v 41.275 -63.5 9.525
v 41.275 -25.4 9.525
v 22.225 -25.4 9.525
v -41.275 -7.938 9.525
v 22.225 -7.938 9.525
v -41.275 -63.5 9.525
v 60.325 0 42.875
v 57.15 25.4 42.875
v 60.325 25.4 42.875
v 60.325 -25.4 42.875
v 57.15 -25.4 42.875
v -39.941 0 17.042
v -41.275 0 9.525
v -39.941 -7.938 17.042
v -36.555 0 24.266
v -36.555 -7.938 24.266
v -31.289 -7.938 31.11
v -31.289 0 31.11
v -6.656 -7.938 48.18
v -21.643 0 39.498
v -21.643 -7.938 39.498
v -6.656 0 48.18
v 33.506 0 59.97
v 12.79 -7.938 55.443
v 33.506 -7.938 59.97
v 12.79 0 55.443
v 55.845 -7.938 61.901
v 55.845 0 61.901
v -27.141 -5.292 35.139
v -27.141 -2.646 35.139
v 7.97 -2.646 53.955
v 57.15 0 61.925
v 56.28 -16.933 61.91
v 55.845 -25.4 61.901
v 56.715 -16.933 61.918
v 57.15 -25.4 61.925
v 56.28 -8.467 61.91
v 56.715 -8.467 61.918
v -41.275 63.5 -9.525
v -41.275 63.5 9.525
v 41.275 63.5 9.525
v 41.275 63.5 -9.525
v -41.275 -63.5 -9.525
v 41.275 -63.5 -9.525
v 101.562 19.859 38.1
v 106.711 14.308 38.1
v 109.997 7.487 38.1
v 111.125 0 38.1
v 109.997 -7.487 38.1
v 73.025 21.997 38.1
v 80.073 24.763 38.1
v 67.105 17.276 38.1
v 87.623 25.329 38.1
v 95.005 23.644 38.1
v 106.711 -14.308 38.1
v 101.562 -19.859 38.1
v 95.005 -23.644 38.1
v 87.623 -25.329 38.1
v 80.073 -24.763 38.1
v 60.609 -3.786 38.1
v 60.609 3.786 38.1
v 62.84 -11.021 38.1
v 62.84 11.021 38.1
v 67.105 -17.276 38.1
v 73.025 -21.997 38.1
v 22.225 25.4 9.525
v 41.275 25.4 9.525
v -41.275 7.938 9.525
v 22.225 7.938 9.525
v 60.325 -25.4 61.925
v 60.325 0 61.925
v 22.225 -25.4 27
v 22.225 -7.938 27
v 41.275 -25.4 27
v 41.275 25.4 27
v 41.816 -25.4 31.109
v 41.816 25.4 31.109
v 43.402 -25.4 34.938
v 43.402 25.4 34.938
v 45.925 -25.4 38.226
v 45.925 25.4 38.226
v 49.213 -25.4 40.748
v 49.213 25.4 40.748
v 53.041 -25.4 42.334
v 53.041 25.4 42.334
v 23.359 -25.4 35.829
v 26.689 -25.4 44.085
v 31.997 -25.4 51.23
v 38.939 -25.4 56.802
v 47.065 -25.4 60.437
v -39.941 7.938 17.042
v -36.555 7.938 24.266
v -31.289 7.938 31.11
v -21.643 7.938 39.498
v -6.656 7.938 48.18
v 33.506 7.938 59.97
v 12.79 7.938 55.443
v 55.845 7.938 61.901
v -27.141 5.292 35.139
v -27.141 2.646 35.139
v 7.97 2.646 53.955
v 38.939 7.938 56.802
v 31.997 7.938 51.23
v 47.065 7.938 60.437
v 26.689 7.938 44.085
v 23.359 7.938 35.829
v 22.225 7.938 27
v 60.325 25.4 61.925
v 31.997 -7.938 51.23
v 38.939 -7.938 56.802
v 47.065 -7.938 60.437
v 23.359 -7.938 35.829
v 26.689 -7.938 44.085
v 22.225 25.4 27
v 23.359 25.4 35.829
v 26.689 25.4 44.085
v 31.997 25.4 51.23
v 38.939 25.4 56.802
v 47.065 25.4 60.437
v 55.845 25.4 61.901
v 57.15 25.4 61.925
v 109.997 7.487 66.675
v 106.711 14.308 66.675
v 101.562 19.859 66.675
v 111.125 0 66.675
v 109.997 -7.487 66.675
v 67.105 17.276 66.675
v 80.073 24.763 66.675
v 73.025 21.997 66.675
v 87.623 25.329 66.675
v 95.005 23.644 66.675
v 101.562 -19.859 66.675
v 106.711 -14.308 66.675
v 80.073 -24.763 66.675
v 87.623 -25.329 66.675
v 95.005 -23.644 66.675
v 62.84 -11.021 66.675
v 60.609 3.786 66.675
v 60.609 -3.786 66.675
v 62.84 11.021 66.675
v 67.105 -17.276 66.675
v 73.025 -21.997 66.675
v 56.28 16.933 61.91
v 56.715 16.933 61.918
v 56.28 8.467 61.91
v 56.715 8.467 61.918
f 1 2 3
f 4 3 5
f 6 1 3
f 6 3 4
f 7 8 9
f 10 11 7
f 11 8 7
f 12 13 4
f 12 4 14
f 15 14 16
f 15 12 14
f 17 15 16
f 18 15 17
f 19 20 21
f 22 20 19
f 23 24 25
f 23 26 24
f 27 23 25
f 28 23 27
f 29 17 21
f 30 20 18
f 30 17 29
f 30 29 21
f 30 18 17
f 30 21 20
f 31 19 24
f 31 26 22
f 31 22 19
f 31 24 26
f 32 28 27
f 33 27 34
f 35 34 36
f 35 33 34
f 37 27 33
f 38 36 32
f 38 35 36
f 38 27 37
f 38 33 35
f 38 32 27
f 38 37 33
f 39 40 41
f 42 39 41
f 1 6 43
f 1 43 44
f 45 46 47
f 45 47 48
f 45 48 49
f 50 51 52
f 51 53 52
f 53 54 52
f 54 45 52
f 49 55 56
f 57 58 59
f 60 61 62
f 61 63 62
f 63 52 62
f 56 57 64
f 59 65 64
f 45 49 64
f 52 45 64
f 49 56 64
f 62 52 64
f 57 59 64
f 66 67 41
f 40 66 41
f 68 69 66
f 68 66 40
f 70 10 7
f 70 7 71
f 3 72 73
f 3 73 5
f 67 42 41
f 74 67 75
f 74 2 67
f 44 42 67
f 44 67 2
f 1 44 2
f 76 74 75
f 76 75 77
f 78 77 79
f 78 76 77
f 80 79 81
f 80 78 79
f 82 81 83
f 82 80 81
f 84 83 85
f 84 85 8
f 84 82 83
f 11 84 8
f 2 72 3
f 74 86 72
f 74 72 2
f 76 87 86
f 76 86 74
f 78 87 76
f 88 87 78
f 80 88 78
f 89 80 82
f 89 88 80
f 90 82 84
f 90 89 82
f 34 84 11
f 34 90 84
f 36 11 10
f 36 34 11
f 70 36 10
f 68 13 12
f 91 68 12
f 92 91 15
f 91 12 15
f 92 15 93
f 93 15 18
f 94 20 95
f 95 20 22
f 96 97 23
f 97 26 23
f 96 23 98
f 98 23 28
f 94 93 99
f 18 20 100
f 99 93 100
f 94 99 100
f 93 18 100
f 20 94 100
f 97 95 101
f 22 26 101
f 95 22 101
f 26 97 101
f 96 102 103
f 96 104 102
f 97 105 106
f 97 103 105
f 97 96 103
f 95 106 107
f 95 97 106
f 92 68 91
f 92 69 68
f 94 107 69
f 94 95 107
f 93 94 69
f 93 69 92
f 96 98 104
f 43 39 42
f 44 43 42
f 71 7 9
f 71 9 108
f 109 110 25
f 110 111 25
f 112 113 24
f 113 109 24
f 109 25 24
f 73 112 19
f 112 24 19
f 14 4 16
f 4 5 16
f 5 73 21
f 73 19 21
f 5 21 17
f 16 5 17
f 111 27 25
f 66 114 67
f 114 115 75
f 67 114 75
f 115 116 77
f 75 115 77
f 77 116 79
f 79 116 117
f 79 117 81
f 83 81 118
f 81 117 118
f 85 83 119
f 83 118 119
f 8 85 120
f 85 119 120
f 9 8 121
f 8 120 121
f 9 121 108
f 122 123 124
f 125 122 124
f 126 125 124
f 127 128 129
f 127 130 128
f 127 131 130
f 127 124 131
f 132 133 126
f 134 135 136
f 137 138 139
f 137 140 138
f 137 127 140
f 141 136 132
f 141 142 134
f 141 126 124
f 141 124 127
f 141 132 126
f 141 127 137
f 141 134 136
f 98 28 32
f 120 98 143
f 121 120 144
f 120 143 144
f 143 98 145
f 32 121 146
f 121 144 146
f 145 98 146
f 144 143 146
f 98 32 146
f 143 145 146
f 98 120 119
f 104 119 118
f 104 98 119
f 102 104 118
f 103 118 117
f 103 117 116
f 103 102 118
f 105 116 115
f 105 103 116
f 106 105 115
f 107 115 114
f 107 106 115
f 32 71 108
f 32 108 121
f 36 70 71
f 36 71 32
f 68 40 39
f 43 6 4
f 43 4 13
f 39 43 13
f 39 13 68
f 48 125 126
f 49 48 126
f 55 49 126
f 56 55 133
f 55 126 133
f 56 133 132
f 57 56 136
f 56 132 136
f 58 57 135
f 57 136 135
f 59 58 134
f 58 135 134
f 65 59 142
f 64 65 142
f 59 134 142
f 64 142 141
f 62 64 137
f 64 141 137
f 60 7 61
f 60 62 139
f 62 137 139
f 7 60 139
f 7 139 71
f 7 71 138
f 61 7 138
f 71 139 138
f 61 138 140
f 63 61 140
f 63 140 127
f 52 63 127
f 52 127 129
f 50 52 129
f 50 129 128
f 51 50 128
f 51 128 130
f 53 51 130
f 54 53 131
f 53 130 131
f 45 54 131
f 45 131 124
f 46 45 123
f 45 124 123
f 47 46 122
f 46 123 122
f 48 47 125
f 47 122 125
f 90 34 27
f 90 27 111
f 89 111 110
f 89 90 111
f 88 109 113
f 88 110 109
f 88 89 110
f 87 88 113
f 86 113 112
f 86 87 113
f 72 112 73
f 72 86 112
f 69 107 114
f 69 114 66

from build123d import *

# Parameters (mm, degrees)
F1_DEPTH = 63.5
F2_DEPTH = 25.4
F3_DEPTH = 7.9375
F0_W     = 25.4
F0_H     = 28.575


with BuildPart() as f1:
    # F0 (on Front) → F1 (new body, symmetric)
    with BuildSketch(Plane.XZ):
        Polygon((-41.275, 9.525), (-41.275, -9.525), (41.275, -9.525), (41.275, 9.525), (22.225, 9.525), align=None)
    extrude(amount=F1_DEPTH, both=True)

    # F0 (on Front) → F2 (join, symmetric)
    with BuildSketch(Plane.XZ):
        with BuildLine():
            Line((22.225, 9.525), (41.275, 9.525))
            Line((41.275, 9.525), (41.275, 27.0002))
            ThreePointArc((41.275, 27.0002), (45.92468, 38.22552), (57.15, 42.8752))
            Line((57.15, 42.8752), (60.325, 42.8752))
            Line((60.325, 42.8752), (60.325, 61.9252))
            Line((60.325, 61.9252), (57.15, 61.9252))
            add(Edge.make_bspline(
                [(55.844966, 61.900809), (56.279499, 61.910538), (56.714518, 61.918672), (57.15, 61.9252)],
                knots=[110.571906, 110.571906, 110.571906, 110.571906, 111.504536, 111.504536, 111.504536, 111.504536], degree=3))
            ThreePointArc((55.844966, 61.900809), (31.997128, 51.230112), (22.225, 27.0002))
            Line((22.225, 27.0002), (22.225, 9.525))
        make_face()
    extrude(amount=F2_DEPTH, both=True)

    # F0 (on Front) → F3 (join, symmetric)
    with BuildSketch(Plane.XZ):
        with BuildLine():
            add(Edge.make_bspline(
                [(-41.275, 9.525), (-40.368903, 37.179671), (4.326996, 60.747394), (55.844966, 61.900809)],
                knots=[0, 0, 0, 0, 110.571906, 110.571906, 110.571906, 110.571906], degree=3))
            Line((-41.275, 9.525), (22.225, 9.525))
            Line((22.225, 9.525), (22.225, 27.0002))
            ThreePointArc((22.225, 27.0002), (31.997128, 51.230112), (55.844966, 61.900809))
        make_face()
    extrude(amount=F3_DEPTH, both=True)

    # F0 (on Front) → F4 (revolve)
    with BuildSketch(Plane.XZ):
        with Locations((98.425, 52.3875)):
            Rectangle(F0_W, F0_H)
    revolve(axis=Axis((85.725, 0, 52.3875), (0, 0, -1)))


solid = f1.part
